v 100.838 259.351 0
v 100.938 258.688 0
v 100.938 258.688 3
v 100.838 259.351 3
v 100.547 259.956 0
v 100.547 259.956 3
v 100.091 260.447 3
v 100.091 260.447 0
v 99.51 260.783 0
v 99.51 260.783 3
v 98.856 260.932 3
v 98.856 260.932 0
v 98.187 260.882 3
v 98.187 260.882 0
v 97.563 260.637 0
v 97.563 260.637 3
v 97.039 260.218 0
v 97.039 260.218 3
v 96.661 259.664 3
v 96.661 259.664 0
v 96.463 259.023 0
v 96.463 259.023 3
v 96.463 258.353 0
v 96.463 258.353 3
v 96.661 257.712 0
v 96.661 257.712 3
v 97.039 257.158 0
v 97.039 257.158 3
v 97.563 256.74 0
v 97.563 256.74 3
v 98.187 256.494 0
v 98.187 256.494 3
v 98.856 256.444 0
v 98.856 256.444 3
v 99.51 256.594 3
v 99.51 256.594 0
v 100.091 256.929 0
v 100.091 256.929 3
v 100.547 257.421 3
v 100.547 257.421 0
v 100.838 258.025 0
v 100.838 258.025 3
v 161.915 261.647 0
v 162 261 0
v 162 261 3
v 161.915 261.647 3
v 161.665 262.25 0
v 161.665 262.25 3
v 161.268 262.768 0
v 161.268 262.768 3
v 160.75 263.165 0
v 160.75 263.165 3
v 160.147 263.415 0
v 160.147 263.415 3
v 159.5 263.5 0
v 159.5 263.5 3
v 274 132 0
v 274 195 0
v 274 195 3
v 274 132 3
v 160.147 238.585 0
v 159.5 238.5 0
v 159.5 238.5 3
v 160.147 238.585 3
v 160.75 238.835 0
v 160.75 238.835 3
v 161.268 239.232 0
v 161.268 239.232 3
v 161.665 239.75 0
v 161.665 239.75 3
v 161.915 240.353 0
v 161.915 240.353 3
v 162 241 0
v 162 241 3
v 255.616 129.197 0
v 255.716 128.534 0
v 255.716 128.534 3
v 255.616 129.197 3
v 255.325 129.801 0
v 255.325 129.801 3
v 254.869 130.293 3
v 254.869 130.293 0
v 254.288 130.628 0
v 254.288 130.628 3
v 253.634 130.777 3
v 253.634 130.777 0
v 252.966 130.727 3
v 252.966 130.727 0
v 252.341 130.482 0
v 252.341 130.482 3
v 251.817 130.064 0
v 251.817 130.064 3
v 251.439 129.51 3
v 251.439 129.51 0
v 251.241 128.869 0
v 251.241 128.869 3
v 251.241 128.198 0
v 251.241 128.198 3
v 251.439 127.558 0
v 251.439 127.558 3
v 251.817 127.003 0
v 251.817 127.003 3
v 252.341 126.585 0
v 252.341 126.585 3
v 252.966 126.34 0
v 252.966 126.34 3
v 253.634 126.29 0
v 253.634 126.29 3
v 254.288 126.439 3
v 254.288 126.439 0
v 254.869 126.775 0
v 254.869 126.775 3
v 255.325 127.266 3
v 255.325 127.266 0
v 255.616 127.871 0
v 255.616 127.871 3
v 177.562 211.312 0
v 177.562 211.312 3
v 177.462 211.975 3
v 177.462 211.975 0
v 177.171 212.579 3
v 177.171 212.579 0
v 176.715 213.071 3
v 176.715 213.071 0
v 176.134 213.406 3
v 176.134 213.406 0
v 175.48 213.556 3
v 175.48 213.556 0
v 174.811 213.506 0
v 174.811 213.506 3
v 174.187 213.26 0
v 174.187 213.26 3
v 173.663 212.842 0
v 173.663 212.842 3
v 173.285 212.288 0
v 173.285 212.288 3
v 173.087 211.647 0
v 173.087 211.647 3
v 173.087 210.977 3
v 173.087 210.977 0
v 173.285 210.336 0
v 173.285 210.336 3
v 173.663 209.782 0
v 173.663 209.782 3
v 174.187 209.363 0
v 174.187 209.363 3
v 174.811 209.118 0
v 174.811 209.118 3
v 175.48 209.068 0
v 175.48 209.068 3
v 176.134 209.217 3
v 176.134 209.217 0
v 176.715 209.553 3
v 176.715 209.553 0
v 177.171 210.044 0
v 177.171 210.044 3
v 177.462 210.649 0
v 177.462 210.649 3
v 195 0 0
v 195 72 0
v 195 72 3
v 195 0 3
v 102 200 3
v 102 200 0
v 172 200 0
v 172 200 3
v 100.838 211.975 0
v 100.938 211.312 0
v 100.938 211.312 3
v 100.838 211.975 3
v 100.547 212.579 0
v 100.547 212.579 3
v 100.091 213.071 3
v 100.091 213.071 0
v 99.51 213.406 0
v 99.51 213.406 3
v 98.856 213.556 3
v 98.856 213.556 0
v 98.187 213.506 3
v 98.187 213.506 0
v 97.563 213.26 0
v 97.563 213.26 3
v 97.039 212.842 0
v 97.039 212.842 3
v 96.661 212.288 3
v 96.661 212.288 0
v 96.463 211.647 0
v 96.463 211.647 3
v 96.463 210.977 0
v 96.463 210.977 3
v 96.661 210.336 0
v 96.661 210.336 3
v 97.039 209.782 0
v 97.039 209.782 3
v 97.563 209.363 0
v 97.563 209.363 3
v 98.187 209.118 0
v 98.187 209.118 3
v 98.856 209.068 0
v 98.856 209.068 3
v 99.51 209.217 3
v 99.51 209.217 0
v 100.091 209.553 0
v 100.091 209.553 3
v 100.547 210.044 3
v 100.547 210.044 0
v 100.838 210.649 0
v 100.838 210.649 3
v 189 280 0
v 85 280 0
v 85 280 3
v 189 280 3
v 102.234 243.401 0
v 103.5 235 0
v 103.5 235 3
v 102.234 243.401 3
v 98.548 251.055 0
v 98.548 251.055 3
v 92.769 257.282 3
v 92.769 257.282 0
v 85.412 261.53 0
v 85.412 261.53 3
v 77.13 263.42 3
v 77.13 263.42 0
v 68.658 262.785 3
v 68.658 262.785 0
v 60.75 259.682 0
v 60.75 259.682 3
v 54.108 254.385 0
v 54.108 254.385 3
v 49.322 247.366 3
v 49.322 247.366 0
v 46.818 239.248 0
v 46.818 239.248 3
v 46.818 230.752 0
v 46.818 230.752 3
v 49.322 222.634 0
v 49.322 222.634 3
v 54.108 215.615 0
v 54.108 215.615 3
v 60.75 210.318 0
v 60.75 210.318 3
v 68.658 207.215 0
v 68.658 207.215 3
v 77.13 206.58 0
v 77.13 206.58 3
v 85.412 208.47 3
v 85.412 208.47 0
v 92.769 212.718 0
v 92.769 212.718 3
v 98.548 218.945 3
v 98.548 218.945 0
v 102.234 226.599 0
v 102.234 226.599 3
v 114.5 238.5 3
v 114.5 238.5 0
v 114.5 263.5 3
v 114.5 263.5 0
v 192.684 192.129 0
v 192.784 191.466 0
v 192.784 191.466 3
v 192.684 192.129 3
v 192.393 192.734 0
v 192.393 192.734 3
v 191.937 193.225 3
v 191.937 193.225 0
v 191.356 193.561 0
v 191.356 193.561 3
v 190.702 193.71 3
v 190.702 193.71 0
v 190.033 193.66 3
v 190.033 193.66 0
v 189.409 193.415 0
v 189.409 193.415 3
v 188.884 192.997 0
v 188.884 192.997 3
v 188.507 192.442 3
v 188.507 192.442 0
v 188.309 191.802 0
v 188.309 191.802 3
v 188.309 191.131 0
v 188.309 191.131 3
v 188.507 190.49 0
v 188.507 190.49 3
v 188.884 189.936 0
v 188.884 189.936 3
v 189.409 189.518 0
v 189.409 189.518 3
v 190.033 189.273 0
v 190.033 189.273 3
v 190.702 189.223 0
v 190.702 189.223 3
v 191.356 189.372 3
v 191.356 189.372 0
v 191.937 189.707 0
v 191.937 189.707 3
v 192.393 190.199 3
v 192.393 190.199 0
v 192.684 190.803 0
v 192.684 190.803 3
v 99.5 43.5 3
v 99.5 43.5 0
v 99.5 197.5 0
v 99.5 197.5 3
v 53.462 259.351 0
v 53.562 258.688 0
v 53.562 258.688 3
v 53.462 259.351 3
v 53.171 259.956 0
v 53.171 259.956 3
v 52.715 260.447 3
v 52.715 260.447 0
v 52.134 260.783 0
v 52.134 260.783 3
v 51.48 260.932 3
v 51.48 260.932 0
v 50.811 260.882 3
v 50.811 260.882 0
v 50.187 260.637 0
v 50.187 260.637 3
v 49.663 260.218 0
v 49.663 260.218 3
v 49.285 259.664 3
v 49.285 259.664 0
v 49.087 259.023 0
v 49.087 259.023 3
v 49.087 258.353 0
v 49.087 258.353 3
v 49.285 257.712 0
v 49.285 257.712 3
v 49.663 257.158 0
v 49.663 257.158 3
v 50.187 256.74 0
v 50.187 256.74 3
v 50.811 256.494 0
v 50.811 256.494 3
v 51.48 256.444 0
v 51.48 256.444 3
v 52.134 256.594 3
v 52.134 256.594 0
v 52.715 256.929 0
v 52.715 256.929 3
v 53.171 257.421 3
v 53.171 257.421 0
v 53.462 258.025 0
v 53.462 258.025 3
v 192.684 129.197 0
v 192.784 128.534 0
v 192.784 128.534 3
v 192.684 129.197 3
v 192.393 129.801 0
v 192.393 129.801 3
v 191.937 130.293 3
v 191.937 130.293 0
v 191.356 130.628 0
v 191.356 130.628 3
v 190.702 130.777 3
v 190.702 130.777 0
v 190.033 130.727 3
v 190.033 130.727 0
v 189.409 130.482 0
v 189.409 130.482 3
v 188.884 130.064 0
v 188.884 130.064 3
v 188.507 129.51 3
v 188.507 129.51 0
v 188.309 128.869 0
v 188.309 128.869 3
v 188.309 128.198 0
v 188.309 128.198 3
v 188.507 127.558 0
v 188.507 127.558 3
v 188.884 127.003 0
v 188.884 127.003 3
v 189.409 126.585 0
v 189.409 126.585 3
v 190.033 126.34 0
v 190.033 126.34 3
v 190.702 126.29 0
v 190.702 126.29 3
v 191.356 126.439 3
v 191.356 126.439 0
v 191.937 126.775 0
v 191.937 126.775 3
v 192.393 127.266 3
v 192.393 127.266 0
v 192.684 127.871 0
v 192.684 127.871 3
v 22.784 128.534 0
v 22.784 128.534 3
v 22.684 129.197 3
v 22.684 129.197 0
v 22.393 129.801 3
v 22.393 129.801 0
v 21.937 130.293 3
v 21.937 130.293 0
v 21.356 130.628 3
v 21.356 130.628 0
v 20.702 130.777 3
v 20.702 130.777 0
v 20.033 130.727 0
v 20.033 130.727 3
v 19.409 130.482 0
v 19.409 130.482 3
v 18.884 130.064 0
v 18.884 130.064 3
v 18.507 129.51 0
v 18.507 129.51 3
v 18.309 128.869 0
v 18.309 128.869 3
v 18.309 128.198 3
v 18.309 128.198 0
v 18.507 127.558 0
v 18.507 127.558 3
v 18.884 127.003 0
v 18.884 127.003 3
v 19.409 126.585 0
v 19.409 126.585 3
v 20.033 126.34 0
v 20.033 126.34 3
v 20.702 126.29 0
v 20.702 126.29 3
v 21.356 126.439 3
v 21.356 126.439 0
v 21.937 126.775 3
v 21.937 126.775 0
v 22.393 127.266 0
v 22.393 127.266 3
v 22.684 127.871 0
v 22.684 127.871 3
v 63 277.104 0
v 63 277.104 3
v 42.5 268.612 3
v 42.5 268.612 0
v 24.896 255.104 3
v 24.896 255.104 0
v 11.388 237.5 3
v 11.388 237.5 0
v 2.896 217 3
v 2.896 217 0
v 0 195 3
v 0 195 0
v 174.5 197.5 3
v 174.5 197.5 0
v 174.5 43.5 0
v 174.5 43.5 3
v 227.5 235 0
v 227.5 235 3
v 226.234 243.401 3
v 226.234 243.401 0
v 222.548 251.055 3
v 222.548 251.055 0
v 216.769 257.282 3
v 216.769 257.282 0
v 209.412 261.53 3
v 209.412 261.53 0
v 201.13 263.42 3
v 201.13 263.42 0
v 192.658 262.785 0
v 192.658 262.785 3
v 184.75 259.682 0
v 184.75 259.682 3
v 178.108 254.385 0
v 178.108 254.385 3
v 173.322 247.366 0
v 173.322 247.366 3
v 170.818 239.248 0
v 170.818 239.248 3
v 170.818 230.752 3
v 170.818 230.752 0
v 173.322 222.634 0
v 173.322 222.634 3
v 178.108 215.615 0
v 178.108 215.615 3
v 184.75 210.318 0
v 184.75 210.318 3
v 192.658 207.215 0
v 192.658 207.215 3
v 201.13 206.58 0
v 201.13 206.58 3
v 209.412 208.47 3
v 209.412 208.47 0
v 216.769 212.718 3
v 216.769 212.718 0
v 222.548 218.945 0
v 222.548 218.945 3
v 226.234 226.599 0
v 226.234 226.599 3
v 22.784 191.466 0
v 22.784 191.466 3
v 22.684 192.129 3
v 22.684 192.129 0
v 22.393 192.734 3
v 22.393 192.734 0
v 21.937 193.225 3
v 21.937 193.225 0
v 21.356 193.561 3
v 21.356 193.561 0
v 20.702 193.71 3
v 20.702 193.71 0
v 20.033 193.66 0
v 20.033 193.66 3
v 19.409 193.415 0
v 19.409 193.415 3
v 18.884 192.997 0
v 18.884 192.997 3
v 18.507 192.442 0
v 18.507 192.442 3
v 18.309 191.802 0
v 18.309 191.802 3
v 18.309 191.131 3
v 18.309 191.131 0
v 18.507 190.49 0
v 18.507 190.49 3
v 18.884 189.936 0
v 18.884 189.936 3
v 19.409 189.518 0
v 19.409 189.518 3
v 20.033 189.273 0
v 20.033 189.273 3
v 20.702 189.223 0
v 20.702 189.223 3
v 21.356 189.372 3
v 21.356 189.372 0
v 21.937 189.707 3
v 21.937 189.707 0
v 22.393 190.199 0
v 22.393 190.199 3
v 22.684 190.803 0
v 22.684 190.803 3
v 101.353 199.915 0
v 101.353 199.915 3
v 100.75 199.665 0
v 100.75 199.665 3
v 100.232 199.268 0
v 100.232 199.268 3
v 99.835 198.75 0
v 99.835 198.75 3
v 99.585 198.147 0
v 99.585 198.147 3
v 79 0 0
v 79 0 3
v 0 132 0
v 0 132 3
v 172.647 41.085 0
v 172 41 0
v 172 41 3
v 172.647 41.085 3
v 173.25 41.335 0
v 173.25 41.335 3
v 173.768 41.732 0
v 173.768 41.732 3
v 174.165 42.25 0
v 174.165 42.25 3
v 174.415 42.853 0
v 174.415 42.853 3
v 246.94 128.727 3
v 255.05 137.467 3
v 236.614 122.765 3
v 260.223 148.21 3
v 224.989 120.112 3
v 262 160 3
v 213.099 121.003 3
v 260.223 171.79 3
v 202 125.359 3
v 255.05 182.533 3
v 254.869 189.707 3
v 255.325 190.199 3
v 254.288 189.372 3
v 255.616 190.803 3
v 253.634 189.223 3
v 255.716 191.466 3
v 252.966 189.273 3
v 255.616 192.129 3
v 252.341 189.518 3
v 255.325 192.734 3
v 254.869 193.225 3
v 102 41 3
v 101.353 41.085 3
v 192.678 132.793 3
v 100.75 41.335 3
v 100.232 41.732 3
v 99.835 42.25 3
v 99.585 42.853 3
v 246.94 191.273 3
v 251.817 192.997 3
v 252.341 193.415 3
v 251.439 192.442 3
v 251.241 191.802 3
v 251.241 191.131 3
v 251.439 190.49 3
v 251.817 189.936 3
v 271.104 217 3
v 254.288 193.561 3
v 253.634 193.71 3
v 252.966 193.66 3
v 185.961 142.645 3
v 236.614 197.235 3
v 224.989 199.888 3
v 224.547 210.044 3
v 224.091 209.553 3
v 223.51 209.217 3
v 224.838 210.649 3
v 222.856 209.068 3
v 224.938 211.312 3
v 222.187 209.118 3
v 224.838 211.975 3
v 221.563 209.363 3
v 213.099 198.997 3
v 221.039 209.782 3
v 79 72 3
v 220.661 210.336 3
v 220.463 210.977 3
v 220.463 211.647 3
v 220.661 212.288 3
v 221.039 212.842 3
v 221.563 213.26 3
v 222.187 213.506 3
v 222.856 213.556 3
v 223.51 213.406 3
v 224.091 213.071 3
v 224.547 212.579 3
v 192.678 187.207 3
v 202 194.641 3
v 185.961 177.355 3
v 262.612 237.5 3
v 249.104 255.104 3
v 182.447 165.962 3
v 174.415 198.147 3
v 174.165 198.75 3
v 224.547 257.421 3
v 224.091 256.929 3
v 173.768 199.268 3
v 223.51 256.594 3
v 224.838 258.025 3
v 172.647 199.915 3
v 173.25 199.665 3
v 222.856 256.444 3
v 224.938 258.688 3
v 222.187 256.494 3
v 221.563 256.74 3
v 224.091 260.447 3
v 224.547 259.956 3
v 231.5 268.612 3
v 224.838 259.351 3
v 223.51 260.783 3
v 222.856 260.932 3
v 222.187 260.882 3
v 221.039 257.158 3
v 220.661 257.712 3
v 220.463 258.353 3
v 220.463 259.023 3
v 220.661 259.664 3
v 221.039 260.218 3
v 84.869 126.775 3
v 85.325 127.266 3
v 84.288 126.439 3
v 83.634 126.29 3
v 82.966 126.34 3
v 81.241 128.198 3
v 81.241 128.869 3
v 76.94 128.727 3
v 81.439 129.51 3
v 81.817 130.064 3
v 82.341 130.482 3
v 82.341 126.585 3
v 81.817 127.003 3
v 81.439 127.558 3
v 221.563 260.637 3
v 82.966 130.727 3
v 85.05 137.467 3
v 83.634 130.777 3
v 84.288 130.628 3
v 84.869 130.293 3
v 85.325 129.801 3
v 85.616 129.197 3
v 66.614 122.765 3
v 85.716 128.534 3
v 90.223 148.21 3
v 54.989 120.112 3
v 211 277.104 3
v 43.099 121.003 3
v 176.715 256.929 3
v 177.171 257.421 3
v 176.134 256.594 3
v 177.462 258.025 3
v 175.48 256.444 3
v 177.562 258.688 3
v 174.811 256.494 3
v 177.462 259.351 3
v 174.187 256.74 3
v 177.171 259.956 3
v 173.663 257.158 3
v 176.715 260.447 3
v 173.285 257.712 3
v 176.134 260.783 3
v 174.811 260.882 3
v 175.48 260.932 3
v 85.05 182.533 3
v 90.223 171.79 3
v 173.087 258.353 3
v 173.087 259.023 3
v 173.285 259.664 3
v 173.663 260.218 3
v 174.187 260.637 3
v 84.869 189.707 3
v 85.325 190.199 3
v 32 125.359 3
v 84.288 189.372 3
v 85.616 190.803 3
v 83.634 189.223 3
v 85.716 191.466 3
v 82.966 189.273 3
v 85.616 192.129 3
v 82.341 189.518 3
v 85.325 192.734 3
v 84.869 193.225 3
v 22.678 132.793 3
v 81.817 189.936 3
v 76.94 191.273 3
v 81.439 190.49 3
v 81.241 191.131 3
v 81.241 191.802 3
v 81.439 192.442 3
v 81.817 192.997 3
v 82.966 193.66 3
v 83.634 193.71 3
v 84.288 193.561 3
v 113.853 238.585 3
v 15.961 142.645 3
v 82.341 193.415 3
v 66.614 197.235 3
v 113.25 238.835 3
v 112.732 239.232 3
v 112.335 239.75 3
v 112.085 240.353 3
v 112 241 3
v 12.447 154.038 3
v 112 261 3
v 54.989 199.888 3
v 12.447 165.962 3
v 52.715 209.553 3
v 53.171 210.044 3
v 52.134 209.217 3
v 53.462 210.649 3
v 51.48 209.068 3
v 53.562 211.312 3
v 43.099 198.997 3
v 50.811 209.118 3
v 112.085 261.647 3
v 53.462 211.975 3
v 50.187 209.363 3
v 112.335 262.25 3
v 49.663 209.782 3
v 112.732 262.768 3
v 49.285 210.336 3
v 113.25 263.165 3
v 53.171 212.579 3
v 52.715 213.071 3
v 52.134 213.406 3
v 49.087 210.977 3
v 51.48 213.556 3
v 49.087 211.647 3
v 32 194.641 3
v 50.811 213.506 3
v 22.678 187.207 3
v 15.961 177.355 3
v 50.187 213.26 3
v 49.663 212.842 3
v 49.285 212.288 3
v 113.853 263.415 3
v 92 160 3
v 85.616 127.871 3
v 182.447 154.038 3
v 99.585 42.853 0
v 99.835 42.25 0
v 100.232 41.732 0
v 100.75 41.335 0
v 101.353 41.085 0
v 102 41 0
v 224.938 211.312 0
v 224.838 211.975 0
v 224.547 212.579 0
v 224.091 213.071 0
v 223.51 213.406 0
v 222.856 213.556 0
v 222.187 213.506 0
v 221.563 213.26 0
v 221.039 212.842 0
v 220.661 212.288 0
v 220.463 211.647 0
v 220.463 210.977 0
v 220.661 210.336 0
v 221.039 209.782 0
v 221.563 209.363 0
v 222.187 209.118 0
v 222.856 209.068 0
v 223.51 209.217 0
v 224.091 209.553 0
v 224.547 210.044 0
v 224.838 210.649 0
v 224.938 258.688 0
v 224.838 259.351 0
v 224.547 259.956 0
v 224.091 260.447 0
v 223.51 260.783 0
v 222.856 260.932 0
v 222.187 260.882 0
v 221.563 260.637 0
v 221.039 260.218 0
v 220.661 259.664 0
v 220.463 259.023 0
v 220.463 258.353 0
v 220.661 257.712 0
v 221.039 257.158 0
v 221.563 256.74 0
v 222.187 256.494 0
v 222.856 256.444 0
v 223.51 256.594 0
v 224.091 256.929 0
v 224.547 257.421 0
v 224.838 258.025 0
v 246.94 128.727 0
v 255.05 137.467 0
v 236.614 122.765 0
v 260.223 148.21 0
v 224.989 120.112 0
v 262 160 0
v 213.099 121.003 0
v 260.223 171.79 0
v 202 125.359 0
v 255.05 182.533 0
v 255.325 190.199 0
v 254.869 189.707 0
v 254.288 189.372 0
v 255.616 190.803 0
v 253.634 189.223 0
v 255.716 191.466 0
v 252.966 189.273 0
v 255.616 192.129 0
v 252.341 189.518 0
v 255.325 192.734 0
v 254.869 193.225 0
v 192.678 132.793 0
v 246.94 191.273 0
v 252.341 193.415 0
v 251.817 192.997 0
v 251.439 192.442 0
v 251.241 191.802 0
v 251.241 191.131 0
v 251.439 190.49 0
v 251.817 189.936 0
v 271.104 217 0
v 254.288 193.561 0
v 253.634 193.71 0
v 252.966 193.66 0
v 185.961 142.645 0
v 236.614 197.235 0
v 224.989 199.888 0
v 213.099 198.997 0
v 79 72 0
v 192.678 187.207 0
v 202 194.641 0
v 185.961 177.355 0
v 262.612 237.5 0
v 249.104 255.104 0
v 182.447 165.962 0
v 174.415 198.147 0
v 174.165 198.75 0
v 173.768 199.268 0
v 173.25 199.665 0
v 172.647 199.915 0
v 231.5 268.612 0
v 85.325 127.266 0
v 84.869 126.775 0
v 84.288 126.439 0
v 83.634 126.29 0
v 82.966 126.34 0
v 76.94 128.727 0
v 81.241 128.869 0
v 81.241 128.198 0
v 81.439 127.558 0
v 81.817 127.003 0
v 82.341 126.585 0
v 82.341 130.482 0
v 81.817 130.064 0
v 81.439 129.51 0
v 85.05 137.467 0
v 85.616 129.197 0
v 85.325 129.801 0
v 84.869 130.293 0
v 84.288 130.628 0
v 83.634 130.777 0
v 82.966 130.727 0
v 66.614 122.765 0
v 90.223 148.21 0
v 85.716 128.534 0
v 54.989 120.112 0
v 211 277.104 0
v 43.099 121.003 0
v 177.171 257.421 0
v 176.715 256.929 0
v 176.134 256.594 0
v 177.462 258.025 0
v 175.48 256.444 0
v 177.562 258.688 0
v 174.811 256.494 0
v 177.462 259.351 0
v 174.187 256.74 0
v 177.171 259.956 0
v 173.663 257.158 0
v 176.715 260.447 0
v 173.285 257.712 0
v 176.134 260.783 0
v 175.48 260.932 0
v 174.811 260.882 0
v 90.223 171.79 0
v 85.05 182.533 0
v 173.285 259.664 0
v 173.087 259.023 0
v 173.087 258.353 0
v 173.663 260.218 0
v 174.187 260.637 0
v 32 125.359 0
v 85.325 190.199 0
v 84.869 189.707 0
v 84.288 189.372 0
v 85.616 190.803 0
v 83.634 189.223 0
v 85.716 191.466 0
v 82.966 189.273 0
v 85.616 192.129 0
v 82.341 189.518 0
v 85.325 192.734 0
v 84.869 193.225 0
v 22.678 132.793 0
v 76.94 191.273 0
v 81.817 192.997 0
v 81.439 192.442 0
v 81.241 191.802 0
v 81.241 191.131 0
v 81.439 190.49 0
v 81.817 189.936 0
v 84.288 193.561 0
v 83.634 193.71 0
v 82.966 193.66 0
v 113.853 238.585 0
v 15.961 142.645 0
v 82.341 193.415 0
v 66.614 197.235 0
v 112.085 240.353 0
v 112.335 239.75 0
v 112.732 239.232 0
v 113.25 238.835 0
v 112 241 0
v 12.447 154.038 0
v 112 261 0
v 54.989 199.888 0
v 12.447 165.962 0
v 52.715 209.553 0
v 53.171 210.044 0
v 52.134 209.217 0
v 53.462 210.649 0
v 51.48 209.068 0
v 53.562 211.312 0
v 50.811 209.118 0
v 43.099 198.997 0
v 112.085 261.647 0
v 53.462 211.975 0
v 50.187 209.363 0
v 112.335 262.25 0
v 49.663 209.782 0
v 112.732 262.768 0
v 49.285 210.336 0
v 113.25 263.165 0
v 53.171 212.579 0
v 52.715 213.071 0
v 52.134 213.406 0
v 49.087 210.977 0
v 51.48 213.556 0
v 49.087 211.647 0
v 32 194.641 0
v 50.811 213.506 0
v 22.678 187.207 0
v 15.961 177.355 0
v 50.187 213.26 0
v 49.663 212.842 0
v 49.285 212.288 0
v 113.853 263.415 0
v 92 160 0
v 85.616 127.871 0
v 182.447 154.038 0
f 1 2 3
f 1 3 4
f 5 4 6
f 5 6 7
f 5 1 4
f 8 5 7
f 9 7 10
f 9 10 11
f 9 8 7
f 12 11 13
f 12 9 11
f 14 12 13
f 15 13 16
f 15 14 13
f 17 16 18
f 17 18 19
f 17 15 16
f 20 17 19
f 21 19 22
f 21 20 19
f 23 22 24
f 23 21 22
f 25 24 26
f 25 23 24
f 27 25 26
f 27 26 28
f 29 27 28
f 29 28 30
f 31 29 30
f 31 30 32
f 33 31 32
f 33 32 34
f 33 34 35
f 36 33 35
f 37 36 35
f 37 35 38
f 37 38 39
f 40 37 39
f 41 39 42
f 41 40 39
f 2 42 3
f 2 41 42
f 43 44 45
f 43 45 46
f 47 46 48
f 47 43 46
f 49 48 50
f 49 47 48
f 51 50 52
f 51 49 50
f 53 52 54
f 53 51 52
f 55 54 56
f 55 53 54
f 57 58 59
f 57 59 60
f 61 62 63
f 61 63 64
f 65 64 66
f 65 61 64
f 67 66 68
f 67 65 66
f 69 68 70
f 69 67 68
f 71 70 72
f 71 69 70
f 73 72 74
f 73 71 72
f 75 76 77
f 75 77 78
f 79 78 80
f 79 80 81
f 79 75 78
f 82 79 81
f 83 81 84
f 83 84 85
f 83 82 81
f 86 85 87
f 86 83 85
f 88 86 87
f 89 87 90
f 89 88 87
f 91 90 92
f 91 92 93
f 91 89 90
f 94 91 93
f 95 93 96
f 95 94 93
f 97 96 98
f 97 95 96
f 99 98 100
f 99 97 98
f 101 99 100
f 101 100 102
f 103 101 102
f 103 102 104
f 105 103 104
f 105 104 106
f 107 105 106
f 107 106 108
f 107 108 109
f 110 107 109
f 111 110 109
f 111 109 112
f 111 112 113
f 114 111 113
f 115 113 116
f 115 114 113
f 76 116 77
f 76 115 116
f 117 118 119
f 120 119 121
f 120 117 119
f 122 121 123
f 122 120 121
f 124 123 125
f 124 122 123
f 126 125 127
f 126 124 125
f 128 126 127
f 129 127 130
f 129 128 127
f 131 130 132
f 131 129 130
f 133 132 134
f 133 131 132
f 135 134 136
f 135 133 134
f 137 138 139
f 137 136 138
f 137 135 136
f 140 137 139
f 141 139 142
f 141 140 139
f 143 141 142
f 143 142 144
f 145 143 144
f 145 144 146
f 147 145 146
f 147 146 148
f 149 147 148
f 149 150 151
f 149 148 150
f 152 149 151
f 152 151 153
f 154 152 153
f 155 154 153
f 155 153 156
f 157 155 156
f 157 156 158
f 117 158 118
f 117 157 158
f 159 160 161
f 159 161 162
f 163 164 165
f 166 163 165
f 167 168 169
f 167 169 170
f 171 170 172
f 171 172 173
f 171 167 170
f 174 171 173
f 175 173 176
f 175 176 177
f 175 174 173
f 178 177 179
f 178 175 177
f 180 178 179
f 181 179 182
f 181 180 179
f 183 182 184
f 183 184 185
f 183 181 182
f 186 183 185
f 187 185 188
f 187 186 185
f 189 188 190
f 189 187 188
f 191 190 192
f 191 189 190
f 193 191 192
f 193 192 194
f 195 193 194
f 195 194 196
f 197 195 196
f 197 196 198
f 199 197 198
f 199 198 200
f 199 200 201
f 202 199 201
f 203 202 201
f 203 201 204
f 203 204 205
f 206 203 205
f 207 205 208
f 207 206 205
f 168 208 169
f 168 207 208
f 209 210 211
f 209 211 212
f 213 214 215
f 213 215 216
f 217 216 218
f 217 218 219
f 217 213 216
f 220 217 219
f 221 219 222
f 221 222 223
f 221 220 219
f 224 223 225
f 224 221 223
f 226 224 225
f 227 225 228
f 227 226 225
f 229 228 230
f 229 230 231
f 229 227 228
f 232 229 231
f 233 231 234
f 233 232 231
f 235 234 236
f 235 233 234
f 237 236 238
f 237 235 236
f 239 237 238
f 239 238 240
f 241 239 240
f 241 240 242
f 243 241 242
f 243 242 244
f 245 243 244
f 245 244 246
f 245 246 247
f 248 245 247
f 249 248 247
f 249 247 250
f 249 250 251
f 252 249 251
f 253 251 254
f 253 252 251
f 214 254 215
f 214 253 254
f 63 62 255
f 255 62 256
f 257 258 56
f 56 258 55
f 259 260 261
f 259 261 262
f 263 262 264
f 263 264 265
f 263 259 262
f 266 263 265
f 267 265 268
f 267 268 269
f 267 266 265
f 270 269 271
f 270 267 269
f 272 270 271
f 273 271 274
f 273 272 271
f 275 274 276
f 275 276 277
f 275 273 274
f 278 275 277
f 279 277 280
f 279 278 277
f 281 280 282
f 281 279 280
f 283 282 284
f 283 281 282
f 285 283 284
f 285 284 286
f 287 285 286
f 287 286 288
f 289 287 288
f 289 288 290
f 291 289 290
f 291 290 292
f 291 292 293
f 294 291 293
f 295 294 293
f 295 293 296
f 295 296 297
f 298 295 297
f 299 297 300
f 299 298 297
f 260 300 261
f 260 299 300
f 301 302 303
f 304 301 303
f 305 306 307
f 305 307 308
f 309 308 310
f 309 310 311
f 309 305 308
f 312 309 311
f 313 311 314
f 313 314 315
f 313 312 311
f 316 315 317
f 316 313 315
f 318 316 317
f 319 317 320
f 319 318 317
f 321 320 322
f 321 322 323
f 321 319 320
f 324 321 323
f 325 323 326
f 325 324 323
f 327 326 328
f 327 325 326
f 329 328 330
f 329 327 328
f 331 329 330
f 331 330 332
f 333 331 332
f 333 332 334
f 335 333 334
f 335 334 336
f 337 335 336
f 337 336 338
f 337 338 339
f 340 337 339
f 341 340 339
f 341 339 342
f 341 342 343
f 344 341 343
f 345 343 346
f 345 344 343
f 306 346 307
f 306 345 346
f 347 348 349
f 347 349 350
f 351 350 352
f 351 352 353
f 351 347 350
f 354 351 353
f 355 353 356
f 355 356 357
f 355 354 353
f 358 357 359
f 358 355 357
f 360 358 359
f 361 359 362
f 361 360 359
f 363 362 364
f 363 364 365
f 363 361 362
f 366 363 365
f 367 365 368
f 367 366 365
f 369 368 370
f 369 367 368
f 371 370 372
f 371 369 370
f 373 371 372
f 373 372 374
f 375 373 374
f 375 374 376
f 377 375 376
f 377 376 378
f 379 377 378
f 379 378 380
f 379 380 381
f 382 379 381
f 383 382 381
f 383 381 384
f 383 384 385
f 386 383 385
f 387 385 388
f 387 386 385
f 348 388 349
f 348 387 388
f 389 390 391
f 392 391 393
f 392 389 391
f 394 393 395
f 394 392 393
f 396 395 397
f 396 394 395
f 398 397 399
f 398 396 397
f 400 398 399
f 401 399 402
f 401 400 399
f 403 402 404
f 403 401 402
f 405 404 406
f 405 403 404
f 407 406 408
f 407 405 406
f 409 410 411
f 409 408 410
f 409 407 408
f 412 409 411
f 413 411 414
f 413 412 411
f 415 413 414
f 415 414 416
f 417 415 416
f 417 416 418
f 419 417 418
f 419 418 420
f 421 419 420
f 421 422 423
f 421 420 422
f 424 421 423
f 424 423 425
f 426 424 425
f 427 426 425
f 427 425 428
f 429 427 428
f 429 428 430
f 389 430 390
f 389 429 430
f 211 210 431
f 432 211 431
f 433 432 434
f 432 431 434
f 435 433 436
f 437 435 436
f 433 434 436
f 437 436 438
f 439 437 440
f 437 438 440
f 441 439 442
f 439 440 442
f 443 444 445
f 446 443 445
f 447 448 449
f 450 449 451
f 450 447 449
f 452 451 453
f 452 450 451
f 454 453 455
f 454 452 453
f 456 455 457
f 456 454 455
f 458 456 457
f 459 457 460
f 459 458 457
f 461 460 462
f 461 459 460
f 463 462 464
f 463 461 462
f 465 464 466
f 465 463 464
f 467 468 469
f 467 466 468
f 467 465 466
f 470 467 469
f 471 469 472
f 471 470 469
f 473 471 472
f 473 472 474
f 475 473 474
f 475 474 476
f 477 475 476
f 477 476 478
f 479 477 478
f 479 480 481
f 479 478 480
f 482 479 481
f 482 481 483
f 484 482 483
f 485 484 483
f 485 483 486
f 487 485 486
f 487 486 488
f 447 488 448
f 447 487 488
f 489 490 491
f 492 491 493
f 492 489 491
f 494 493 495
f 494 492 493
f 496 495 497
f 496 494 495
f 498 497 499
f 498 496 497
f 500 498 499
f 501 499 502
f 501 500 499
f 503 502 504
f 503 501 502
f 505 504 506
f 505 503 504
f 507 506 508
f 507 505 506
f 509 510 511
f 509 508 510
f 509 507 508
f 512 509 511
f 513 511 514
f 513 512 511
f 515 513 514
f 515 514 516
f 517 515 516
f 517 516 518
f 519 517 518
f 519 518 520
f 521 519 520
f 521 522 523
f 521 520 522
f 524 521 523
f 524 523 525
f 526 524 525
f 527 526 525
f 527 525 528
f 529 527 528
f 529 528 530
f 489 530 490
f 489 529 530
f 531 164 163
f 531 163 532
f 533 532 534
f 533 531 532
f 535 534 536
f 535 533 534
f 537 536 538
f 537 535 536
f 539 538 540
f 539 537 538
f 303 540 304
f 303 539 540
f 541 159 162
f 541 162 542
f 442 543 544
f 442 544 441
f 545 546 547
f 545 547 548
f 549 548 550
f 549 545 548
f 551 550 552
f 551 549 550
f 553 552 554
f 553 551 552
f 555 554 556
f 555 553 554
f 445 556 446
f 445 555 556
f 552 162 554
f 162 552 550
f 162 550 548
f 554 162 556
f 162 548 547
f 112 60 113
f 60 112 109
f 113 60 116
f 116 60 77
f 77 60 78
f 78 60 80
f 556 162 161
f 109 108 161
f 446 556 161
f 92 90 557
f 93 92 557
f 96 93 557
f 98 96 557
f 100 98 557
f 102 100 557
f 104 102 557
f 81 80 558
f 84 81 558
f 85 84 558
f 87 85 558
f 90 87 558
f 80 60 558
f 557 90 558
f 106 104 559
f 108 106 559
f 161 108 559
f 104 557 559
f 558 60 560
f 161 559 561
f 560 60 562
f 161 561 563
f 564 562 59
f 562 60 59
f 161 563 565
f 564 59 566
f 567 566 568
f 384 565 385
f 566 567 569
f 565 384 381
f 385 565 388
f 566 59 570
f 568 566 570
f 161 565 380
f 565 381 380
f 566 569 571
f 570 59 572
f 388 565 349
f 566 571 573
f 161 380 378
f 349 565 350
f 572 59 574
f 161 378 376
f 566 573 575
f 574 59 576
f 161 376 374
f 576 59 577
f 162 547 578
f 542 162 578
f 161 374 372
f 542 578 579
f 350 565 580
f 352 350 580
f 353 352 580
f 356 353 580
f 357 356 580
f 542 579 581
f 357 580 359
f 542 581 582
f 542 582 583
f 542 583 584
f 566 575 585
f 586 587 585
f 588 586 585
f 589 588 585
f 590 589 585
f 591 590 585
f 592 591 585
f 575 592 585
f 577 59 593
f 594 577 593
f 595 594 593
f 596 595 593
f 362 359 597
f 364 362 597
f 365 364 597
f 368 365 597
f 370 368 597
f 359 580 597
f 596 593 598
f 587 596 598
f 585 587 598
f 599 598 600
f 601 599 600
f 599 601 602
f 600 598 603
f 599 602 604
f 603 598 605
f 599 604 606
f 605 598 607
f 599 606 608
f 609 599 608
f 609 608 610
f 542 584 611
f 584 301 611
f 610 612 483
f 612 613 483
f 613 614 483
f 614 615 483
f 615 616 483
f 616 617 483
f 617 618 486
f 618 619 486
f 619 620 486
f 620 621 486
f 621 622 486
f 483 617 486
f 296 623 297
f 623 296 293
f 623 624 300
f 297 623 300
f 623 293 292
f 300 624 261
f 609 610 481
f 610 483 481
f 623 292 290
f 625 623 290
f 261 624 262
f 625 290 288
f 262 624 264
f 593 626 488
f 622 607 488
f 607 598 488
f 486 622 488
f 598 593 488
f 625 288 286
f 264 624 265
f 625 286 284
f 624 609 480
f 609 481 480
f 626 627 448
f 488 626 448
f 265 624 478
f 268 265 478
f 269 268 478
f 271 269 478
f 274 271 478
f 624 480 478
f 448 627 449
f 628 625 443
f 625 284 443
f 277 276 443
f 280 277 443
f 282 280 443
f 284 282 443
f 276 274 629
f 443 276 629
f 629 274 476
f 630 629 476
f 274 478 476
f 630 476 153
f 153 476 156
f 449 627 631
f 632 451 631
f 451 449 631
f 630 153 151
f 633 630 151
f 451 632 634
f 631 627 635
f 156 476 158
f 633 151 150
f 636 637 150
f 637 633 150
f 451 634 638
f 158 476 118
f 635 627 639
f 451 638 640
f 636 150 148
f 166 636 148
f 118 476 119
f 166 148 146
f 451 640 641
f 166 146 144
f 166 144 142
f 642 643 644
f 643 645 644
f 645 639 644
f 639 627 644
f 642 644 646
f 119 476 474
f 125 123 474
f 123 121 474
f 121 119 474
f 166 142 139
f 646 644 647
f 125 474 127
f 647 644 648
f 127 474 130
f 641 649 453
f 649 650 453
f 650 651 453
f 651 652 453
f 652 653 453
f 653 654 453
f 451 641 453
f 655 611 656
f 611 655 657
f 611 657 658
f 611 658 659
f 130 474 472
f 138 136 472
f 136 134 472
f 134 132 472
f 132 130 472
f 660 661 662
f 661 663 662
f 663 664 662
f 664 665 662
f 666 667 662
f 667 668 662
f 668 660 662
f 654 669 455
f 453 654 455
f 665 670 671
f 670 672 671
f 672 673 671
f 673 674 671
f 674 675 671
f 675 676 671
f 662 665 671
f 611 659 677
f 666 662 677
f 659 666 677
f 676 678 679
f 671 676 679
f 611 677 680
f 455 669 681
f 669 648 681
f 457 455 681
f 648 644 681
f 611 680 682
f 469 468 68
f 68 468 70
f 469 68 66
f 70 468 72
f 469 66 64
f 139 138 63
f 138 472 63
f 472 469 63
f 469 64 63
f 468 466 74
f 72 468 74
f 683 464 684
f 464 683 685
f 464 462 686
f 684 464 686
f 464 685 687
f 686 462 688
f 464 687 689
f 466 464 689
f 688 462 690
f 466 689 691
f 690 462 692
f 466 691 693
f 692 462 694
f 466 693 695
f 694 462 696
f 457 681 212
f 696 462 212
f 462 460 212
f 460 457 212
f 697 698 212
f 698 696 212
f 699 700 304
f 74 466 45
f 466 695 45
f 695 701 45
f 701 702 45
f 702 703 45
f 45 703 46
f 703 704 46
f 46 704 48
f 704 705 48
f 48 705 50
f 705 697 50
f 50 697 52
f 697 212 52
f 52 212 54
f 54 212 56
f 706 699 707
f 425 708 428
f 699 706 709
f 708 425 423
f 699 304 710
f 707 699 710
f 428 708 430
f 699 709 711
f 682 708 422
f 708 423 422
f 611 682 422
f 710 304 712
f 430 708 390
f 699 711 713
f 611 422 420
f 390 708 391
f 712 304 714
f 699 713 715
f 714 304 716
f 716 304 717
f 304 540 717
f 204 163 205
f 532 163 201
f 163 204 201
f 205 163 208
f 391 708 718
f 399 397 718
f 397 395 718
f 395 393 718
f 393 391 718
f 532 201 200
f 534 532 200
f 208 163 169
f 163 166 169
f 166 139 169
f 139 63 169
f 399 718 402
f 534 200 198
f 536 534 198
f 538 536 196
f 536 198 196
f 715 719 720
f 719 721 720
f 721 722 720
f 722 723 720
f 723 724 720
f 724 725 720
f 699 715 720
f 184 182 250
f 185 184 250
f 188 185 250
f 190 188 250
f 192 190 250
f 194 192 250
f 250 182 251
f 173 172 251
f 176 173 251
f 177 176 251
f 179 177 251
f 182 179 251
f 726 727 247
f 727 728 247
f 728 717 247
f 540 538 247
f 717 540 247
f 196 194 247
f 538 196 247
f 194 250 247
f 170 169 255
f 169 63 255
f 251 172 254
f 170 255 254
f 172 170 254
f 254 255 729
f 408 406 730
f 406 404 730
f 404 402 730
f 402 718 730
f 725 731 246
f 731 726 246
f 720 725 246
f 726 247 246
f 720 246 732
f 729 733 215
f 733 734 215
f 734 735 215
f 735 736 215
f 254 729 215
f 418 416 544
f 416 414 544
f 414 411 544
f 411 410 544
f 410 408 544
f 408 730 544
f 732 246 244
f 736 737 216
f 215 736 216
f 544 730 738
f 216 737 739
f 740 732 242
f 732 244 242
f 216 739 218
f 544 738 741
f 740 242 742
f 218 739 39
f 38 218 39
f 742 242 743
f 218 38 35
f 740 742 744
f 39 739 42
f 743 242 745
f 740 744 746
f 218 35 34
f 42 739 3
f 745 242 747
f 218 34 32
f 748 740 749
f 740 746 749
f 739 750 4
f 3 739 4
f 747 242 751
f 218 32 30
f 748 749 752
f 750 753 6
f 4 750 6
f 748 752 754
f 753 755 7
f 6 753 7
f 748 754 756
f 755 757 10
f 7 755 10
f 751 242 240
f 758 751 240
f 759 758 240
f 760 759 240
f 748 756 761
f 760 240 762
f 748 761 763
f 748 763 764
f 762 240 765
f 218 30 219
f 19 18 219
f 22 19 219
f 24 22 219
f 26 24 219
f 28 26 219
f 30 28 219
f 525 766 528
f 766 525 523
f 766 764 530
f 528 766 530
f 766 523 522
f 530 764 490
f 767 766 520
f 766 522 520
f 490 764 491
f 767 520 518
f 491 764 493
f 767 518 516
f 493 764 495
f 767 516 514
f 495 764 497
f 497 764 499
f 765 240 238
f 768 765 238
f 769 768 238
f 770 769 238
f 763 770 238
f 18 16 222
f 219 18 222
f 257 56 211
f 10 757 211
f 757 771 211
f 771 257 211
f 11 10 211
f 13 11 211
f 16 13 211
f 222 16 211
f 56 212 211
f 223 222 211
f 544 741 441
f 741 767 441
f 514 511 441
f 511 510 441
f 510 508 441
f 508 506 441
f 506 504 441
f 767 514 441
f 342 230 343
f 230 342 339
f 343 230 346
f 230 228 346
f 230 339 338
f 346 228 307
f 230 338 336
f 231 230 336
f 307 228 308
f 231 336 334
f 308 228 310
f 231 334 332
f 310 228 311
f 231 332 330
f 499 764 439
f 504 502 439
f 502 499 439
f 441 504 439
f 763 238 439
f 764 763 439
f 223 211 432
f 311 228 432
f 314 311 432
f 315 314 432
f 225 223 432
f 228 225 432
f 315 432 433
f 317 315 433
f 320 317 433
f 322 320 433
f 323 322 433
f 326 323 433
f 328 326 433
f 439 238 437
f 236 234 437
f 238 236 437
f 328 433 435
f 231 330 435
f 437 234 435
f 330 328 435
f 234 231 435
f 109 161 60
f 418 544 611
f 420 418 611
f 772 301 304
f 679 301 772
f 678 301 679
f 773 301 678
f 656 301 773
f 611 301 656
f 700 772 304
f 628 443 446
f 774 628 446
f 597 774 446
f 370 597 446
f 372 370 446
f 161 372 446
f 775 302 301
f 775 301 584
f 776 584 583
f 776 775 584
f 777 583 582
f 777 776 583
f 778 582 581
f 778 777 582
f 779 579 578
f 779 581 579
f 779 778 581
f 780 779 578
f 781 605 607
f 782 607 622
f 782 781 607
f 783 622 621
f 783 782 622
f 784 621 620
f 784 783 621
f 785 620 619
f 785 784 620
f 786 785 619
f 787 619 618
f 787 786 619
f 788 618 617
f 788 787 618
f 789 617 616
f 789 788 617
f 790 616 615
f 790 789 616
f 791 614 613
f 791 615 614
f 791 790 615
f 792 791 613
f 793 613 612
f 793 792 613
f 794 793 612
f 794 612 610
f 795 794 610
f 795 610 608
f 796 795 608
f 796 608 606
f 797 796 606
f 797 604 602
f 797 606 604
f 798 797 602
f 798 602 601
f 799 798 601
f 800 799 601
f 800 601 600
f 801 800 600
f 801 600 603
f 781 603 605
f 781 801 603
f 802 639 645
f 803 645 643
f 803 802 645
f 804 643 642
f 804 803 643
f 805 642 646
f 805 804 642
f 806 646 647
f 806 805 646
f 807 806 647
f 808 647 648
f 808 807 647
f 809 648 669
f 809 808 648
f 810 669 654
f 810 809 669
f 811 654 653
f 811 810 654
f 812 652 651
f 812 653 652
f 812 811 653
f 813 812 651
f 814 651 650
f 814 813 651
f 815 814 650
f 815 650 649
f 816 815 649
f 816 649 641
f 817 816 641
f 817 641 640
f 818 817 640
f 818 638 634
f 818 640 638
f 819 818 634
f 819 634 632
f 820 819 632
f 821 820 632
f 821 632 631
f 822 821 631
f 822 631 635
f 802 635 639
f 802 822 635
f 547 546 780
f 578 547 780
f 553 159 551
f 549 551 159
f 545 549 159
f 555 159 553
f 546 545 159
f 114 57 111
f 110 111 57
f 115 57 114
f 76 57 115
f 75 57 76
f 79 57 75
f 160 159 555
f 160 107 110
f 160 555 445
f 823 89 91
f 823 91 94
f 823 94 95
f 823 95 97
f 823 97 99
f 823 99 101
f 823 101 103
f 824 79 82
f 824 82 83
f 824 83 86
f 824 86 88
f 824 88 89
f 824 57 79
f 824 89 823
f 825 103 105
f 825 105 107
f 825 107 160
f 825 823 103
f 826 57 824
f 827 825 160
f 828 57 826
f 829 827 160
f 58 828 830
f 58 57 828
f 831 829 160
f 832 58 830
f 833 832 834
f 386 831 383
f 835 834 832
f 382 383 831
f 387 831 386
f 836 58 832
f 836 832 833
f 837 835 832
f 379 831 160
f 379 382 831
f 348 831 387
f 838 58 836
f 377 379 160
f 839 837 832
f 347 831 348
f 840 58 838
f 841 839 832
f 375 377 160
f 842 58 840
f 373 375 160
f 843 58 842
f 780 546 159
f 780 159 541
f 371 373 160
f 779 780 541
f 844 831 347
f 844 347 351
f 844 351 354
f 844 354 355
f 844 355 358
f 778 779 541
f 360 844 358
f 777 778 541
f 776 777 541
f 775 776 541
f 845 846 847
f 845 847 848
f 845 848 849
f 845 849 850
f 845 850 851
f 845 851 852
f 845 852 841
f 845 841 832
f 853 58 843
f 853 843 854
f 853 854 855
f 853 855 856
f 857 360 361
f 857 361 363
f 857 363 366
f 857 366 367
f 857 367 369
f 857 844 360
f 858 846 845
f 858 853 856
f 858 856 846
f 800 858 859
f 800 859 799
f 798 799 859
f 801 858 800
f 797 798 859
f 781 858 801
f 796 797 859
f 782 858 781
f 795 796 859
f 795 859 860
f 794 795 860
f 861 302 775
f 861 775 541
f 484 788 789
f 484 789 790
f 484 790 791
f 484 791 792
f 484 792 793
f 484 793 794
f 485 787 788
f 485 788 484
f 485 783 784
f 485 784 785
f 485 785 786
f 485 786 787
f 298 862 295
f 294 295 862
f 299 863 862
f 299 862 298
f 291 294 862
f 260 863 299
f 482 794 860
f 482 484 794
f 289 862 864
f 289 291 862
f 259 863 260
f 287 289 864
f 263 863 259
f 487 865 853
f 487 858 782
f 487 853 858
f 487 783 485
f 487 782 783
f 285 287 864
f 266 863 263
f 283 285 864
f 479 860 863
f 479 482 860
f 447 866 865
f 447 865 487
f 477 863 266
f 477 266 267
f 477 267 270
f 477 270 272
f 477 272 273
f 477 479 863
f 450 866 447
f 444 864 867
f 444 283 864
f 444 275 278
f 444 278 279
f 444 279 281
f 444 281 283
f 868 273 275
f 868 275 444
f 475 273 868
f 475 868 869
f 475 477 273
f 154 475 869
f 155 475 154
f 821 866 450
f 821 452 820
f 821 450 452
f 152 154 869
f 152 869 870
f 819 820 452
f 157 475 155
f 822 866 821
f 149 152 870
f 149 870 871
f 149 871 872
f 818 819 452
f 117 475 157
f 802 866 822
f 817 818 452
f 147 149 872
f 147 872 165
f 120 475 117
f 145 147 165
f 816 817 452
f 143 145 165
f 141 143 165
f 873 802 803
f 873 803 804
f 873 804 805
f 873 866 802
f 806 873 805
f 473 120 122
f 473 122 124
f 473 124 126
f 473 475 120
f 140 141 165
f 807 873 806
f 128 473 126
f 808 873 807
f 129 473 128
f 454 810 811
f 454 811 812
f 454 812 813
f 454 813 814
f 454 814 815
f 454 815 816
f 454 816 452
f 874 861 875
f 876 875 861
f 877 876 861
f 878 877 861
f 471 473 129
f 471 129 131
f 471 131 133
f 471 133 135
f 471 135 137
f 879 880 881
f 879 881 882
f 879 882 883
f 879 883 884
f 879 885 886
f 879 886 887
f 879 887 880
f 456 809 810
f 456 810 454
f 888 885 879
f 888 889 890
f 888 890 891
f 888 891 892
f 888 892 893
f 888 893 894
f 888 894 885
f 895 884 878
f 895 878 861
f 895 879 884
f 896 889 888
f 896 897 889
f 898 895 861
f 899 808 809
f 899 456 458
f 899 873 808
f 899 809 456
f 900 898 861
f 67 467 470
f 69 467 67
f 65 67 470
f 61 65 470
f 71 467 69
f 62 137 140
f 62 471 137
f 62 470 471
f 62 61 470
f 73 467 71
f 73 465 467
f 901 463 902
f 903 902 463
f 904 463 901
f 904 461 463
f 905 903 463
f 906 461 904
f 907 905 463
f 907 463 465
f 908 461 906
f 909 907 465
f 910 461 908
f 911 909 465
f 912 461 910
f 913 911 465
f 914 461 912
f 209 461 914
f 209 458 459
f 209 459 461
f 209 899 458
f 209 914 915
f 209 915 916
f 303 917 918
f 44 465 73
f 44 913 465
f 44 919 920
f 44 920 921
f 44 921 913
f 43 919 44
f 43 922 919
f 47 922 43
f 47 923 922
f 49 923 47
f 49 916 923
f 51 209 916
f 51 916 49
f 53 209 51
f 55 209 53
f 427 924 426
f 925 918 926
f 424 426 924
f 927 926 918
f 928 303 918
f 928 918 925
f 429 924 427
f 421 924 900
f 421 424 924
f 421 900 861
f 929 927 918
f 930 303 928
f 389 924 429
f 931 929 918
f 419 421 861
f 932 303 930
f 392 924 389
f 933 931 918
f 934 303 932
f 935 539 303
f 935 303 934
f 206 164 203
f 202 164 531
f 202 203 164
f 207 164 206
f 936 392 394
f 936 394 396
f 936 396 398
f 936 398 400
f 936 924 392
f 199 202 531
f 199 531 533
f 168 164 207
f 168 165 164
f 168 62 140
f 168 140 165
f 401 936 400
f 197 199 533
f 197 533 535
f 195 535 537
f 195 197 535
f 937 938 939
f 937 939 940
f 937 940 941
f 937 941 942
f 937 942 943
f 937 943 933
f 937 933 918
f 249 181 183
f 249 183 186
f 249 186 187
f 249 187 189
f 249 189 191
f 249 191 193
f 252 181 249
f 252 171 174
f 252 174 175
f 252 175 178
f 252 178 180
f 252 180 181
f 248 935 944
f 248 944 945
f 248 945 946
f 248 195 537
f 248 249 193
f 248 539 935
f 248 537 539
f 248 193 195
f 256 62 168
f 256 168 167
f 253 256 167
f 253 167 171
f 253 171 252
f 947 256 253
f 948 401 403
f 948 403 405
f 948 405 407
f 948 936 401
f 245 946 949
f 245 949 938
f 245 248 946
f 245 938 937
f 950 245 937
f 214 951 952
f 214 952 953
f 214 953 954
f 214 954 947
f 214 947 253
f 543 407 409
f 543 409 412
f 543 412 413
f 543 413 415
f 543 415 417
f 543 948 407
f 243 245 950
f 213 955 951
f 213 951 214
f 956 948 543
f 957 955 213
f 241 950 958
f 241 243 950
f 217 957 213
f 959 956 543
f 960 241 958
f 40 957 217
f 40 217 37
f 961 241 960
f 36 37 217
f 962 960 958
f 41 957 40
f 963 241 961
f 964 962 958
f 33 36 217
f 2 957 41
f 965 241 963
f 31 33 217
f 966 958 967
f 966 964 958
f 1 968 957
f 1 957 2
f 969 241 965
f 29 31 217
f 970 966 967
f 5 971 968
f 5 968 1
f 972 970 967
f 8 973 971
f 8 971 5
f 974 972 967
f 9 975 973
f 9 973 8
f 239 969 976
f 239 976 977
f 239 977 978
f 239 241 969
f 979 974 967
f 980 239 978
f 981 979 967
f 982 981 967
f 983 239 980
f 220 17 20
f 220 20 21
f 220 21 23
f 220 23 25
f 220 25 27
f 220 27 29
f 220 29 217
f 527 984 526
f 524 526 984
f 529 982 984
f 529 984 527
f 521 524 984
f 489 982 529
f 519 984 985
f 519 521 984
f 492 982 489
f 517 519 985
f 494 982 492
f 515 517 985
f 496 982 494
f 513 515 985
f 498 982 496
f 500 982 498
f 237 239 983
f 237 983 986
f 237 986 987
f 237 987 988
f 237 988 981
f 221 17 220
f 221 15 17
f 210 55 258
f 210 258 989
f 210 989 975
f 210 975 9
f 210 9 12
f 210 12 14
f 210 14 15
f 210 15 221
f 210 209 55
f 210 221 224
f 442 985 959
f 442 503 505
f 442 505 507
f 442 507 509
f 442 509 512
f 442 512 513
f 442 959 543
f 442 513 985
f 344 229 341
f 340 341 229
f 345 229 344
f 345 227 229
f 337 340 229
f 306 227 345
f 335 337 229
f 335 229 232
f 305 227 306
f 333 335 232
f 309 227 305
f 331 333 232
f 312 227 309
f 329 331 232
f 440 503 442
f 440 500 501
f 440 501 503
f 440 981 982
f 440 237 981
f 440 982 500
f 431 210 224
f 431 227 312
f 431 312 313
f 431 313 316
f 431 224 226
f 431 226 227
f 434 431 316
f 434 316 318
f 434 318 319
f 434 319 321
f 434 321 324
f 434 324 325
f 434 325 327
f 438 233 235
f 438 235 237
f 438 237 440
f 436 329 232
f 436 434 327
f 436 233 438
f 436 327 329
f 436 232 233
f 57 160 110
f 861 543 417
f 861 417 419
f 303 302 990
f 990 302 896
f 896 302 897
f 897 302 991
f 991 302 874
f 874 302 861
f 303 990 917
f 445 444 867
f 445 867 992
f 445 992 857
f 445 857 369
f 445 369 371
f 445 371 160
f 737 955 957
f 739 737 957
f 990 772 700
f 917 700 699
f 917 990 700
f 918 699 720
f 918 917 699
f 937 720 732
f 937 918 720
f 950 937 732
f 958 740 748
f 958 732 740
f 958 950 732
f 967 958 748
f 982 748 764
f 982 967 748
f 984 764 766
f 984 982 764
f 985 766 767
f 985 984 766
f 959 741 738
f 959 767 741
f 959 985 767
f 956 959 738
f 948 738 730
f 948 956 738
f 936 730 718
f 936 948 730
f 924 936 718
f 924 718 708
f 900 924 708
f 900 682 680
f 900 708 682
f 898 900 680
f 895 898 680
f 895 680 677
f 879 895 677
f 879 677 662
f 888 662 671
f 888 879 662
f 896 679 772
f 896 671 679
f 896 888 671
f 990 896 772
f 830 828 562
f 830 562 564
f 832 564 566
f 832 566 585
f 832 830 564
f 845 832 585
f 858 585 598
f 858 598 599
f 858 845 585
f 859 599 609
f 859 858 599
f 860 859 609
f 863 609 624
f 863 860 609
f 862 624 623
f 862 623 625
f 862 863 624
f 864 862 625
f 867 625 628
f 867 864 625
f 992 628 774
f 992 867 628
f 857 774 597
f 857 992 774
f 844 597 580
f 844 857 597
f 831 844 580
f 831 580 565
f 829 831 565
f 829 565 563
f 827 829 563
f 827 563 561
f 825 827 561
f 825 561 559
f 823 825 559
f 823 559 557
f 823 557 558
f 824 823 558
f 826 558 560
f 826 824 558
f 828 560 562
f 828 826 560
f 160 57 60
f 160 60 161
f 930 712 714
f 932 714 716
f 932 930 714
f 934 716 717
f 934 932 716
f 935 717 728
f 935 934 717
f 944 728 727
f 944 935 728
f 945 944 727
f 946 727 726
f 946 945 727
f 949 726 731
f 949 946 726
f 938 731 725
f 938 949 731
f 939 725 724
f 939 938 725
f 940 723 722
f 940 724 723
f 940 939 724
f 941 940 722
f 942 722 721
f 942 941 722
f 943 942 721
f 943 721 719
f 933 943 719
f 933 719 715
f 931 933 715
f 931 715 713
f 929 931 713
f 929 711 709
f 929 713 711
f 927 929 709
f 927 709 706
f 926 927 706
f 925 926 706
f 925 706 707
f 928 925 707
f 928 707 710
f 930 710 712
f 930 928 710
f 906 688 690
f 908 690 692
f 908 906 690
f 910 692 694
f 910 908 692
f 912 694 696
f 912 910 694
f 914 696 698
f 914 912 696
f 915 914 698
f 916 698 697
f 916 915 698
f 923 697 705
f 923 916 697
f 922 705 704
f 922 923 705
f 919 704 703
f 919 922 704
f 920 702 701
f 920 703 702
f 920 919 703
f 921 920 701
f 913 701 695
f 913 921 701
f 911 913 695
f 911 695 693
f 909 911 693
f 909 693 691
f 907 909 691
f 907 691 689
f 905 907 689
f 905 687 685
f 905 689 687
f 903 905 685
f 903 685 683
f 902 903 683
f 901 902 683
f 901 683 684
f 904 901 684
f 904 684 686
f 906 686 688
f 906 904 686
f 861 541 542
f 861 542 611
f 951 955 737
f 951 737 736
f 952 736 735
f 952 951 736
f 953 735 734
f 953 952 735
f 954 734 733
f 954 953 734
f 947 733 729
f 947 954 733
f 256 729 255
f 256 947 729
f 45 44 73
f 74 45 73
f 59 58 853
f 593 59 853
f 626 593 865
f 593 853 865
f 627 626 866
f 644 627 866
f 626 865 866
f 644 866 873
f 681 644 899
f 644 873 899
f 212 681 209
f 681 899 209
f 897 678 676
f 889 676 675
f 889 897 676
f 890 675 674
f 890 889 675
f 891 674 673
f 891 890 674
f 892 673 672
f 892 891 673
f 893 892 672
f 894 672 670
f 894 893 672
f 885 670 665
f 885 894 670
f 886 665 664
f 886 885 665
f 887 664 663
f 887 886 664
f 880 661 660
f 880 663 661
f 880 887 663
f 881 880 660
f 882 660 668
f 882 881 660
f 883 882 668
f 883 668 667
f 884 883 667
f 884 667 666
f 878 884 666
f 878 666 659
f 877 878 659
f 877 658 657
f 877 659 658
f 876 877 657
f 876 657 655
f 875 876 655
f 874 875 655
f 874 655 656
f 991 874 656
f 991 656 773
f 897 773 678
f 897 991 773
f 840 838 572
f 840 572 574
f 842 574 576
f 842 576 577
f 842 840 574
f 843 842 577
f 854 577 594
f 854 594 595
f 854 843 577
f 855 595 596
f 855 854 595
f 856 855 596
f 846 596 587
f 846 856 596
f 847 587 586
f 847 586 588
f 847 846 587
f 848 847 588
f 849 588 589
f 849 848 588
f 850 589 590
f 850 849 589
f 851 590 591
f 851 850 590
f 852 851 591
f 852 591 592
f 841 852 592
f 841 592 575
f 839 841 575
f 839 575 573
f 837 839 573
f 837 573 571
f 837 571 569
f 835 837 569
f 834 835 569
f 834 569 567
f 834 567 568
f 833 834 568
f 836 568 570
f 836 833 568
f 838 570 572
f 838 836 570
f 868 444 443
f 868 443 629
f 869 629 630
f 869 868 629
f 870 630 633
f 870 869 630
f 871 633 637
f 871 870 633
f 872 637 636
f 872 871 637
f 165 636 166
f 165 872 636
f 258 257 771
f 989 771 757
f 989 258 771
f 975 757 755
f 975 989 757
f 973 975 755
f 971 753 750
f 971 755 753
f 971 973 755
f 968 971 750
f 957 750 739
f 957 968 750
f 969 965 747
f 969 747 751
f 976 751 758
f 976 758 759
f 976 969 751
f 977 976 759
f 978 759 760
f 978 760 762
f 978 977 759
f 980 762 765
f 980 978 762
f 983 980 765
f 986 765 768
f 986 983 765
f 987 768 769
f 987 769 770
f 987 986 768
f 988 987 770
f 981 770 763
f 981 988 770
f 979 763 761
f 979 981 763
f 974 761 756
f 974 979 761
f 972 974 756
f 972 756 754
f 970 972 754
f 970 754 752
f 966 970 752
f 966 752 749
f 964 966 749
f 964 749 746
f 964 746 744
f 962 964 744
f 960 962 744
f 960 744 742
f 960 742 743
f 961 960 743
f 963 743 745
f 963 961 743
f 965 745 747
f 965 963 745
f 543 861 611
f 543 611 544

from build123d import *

# Parameters (mm, degrees)
PAD_DEPTH         = 3
SKETCH001_R       = 28.5
SKETCH001_R_2     = 2.25
POCKET_DEPTH      = 3
SKETCH_R          = 40
SKETCH_R_2        = 2.25
POCKET001_DEPTH   = 3
COPYSKETCH003_R   = 40
COPYSKETCH003_R_2 = 2.25
POCKET002_DEPTH   = 5
SKETCH003_R       = 28.5
SKETCH003_R_2     = 2.25
POCKET004_DEPTH   = 5
POCKET005_DEPTH   = 5
POCKET006_DEPTH   = 5


with BuildPart() as part:
    # Sketch002 → Pad (new body)
    with BuildSketch(Plane.XY):
        with BuildLine():
            Line((0, 132), (0, 195))
            ThreePointArc((85, 280), (24.895924, 255.104076), (0, 195))
            Line((85, 280), (189, 280))
            ThreePointArc((274, 195), (249.104076, 255.104076), (189, 280))
            Line((274, 195), (274, 132))
            Line((274, 132), (195, 72))
            Line((195, 72), (195, 0))
            Line((195, 0), (79, 0))
            Line((79, 0), (79, 72))
            Line((79, 72), (0, 132))
        make_face()
    extrude(amount=PAD_DEPTH)

    # Sketch001 → Pocket (cut)
    with BuildSketch(Plane.XY):
        with Locations((75, 235)):
            Circle(SKETCH001_R)
        with Locations((98.688077, 258.688077)):
            Circle(SKETCH001_R_2)
        with Locations((51.311923, 258.688077)):
            Circle(SKETCH001_R_2)
        with Locations((51.311923, 211.311923)):
            Circle(SKETCH001_R_2)
        with Locations((98.688077, 211.311923)):
            Circle(SKETCH001_R_2)
    extrude(amount=POCKET_DEPTH, mode=Mode.SUBTRACT)

    # Sketch → Pocket001 (cut)
    with BuildSketch(Plane.XY):
        with Locations((222, 160)):
            Circle(SKETCH_R)
        with Locations((253.466252, 191.466252)):
            Circle(SKETCH_R_2)
        with Locations((190.533748, 191.466252)):
            Circle(SKETCH_R_2)
        with Locations((190.533748, 128.533748)):
            Circle(SKETCH_R_2)
        with Locations((253.466252, 128.533748)):
            Circle(SKETCH_R_2)
    extrude(amount=POCKET001_DEPTH, mode=Mode.SUBTRACT)

    # CopySketch003 → Pocket002 (cut)
    with BuildSketch(Plane.XY):
        with Locations((52, 160)):
            Circle(COPYSKETCH003_R)
        with Locations((83.466252, 191.466252)):
            Circle(COPYSKETCH003_R_2)
        with Locations((20.533748, 191.466252)):
            Circle(COPYSKETCH003_R_2)
        with Locations((20.533748, 128.533748)):
            Circle(COPYSKETCH003_R_2)
        with Locations((83.466252, 128.533748)):
            Circle(COPYSKETCH003_R_2)
    extrude(amount=POCKET002_DEPTH, mode=Mode.SUBTRACT)

    # Sketch003 → Pocket004 (cut)
    with BuildSketch(Plane.XY):
        with Locations((199, 235)):
            Circle(SKETCH003_R)
        with Locations((222.688077, 258.688077)):
            Circle(SKETCH003_R_2)
        with Locations((175.311923, 258.688077)):
            Circle(SKETCH003_R_2)
        with Locations((175.311923, 211.311923)):
            Circle(SKETCH003_R_2)
        with Locations((222.688077, 211.311923)):
            Circle(SKETCH003_R_2)
    extrude(amount=POCKET004_DEPTH, mode=Mode.SUBTRACT)

    # Sketch004 → Pocket005 (cut)
    with BuildSketch(Plane.XY):
        with BuildLine():
            Line((114.5, 263.5), (159.5, 263.5))
            ThreePointArc((162, 261), (161.267767, 262.767767), (159.5, 263.5))
            Line((162, 261), (162, 241))
            ThreePointArc((159.5, 238.5), (161.267767, 239.232233), (162, 241))
            Line((159.5, 238.5), (114.5, 238.5))
            ThreePointArc((112, 241), (112.732233, 239.232233), (114.5, 238.5))
            Line((112, 241), (112, 261))
            ThreePointArc((114.5, 263.5), (112.732233, 262.767767), (112, 261))
        make_face()
    extrude(amount=POCKET005_DEPTH, mode=Mode.SUBTRACT)

    # CopySketch005 → Pocket006 (cut)
    with BuildSketch(Plane.XY):
        with BuildLine():
            Line((102, 200), (172, 200))
            ThreePointArc((174.5, 197.5), (173.767767, 199.267767), (172, 200))
            Line((174.5, 197.5), (174.5, 43.5))
            ThreePointArc((172, 41), (173.767767, 41.732233), (174.5, 43.5))
            Line((172, 41), (102, 41))
            ThreePointArc((99.5, 43.5), (100.232233, 41.732233), (102, 41))
            Line((99.5, 43.5), (99.5, 197.5))
            ThreePointArc((102, 200), (100.232233, 199.267767), (99.5, 197.5))
        make_face()
    extrude(amount=POCKET006_DEPTH, mode=Mode.SUBTRACT)


solid = part.part
